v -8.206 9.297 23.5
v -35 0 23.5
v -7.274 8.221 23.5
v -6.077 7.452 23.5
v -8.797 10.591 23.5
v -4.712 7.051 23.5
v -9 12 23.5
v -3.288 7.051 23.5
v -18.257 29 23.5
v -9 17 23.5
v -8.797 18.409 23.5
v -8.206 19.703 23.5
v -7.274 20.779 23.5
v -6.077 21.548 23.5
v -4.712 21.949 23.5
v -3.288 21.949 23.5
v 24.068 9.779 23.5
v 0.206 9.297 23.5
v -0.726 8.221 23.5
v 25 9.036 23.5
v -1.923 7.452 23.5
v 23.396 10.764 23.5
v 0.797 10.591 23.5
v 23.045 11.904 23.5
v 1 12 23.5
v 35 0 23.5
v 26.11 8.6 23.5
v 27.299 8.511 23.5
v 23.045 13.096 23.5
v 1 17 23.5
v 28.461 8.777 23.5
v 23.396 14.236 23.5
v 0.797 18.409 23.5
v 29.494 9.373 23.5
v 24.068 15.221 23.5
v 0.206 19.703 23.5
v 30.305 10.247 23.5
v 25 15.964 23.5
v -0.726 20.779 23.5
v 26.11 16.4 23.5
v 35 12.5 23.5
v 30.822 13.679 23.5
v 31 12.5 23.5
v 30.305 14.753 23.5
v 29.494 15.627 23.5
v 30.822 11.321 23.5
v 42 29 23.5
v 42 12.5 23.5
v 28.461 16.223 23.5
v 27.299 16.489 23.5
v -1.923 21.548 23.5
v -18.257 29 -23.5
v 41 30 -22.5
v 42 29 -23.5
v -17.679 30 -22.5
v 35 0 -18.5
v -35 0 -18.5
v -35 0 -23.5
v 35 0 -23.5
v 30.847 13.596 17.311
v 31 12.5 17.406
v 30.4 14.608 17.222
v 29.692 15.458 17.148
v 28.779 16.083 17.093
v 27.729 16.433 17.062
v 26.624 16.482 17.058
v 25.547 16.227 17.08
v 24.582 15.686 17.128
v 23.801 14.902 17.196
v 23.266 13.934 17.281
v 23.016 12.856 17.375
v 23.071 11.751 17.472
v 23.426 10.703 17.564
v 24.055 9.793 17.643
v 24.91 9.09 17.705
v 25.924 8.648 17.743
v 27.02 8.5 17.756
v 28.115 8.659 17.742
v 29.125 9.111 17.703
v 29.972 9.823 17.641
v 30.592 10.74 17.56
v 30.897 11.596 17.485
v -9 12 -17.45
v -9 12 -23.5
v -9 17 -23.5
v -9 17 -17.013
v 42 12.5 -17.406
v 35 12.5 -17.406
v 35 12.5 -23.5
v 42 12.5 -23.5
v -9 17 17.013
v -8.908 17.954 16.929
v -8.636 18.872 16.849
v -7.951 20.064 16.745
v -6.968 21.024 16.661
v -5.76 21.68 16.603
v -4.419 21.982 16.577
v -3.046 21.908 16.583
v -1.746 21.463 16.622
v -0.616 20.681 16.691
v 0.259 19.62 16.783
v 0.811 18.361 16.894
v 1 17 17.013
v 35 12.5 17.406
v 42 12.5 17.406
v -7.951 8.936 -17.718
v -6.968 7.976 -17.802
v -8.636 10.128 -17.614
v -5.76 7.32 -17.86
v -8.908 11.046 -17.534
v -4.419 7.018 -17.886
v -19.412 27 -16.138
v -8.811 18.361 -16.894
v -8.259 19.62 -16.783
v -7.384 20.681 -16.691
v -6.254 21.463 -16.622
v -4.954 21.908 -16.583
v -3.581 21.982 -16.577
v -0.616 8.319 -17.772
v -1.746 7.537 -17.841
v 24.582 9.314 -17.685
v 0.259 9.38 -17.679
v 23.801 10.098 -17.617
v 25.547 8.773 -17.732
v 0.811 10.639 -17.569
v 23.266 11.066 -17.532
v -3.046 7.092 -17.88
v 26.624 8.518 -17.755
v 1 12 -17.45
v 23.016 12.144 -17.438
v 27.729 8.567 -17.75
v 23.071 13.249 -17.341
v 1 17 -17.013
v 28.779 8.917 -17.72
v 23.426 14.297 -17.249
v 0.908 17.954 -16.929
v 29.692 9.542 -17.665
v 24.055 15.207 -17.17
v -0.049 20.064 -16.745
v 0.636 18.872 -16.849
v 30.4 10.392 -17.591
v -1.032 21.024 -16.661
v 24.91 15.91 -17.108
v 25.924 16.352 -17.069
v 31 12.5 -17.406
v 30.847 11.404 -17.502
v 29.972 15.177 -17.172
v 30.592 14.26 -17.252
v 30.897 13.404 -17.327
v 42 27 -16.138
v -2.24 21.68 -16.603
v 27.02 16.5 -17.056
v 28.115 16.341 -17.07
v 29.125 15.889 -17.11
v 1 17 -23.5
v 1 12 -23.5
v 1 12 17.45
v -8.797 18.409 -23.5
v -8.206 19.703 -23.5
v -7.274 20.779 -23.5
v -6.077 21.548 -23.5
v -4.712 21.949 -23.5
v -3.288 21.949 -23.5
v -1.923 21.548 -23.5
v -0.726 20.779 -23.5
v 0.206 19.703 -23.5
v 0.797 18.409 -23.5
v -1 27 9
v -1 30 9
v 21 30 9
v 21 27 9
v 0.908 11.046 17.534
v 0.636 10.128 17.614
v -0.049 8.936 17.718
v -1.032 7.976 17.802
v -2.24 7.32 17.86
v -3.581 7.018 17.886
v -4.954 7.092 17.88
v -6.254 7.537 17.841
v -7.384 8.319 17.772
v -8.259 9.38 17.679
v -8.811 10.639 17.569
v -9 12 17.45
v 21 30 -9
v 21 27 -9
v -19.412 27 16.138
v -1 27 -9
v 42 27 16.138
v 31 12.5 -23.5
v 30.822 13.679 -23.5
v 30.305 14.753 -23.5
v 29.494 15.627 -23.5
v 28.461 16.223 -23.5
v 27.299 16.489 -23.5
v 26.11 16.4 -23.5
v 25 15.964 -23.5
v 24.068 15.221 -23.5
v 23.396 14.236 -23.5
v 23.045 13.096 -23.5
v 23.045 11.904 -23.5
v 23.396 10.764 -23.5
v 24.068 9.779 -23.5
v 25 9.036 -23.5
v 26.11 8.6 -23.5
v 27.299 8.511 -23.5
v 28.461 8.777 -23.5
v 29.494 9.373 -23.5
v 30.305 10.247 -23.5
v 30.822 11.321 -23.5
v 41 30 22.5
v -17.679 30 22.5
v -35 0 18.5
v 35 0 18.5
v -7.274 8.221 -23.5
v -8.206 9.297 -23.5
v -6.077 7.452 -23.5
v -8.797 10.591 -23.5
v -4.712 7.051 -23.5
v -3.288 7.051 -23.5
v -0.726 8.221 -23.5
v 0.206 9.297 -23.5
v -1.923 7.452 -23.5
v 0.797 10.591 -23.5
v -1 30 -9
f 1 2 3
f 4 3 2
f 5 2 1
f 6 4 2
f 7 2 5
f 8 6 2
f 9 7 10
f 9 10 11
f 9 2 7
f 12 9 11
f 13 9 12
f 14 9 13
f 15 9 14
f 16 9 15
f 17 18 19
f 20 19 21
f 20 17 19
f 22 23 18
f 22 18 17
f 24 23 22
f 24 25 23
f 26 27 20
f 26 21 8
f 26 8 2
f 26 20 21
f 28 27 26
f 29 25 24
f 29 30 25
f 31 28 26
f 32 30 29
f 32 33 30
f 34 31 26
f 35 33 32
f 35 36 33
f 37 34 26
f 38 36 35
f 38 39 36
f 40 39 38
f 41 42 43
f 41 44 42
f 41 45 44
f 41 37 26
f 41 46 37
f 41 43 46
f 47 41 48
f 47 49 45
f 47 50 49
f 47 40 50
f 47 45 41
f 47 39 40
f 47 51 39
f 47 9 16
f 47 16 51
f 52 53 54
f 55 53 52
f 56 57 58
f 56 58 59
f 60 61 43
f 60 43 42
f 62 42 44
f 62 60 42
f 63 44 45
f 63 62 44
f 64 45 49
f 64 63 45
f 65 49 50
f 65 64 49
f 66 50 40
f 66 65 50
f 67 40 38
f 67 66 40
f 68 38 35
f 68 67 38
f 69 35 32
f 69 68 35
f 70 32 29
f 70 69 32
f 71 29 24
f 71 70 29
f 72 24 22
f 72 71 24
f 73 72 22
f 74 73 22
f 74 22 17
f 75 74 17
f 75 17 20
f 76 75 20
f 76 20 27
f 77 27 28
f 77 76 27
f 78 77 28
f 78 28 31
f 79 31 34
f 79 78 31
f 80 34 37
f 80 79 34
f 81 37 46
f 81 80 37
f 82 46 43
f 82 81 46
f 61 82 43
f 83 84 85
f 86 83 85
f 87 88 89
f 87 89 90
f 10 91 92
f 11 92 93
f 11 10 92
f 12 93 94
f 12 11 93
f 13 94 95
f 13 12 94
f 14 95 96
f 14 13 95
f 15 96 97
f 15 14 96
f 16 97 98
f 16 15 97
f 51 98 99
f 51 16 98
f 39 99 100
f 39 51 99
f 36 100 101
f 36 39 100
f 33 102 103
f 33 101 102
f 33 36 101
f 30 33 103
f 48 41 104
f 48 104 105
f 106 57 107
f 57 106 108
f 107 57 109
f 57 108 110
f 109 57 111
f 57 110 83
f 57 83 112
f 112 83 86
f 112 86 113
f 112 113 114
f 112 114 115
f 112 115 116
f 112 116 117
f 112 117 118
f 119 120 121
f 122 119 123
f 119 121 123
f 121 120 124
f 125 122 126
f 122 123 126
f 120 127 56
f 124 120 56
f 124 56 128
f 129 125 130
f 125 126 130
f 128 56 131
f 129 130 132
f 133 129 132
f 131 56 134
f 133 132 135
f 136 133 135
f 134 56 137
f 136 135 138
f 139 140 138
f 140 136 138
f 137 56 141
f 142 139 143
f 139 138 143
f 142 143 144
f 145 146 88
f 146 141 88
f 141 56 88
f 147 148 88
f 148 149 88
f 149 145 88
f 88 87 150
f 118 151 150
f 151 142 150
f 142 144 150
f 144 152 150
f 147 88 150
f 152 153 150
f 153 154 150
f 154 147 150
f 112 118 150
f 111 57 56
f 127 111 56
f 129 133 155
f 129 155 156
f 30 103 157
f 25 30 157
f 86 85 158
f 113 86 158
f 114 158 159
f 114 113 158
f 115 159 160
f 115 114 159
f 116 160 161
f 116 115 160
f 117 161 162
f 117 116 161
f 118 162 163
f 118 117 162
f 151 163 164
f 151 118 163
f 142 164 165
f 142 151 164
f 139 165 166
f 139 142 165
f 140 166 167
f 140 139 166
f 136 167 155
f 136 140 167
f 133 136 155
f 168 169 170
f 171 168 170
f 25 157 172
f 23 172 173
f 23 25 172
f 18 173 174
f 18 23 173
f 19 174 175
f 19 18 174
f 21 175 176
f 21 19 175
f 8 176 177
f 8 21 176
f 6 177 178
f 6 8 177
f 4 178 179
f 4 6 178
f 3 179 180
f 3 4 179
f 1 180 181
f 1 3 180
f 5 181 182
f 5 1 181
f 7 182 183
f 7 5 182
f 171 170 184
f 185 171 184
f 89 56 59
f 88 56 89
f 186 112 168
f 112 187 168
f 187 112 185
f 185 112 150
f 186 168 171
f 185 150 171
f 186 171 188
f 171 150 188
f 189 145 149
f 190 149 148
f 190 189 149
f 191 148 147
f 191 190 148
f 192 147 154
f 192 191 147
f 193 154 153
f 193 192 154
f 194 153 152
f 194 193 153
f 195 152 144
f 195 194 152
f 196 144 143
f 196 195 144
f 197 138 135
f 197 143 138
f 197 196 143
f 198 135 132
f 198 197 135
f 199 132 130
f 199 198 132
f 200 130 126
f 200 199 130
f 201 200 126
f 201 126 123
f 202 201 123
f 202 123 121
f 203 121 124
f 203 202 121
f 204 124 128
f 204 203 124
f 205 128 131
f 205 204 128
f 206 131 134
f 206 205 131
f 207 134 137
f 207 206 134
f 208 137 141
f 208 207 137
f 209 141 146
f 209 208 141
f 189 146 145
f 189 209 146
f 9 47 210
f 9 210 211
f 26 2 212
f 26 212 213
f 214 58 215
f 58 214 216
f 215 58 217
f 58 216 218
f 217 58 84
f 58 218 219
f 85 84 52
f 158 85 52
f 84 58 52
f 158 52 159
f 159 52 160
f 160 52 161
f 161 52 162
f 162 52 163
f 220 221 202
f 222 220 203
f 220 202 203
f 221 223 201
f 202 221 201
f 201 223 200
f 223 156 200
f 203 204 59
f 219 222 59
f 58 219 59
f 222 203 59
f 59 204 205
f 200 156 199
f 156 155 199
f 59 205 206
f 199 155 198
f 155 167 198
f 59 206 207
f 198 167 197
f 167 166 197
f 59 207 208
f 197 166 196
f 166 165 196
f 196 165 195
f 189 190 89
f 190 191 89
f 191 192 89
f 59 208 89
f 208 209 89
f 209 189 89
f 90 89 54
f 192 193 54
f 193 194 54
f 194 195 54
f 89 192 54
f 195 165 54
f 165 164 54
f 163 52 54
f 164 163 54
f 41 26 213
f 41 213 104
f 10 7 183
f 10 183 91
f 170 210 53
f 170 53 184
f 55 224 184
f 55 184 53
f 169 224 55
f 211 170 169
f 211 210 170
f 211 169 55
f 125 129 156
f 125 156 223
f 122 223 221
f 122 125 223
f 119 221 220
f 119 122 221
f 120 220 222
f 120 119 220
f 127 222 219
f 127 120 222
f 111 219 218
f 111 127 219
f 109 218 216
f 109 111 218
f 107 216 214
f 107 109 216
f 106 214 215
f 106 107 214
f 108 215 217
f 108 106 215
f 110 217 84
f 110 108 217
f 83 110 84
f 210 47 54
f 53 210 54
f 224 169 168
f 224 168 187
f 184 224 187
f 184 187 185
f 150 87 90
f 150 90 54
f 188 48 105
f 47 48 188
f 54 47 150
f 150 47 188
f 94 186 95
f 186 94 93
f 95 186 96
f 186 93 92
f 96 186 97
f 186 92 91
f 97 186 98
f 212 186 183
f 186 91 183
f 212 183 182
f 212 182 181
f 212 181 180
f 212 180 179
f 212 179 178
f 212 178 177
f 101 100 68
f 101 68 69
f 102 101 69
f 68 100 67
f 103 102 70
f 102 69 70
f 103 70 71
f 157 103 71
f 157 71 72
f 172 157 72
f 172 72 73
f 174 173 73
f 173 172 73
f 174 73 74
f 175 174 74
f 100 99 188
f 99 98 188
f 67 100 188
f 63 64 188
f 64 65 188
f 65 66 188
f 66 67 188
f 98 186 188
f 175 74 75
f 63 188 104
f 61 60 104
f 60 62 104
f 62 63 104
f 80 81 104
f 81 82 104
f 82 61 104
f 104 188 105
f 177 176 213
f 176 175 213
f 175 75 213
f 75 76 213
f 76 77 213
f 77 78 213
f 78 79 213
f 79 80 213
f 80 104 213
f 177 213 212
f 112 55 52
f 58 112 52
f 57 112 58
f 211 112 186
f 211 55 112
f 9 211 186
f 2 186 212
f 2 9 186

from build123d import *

# Parameters (mm, degrees)
SKETCH1_R           = 4
BOSS_EXTRUDE1_DEPTH = 23.5
CUT_EXTRUDE1_REACH  = 87.914
CUT_EXTRUDE2_REACH  = 58.712
SKETCH3_W           = 22
SKETCH3_H           = 18
CHAMFER1_SIZE       = 1


with BuildPart() as part:
    # Sketch1 → Boss-Extrude1 (new, symmetric)
    with BuildSketch(Plane.XY):
        Polygon((-35, 0), (35, 0), (35, 12.5), (42, 12.5), (42, 30), (-17.679491924, 30), align=None)
        with Locations((27, 12.5)):
            Circle(SKETCH1_R, mode=Mode.SUBTRACT)
        with BuildLine():
            Line((-9, 12), (-9, 17))
            ThreePointArc((-9, 17), (-4, 22), (1, 17))
            Line((1, 17), (1, 12))
            ThreePointArc((1, 12), (-4, 7), (-9, 12))
        make_face(mode=Mode.SUBTRACT)
    extrude(amount=BOSS_EXTRUDE1_DEPTH, both=True)

    # Sketch2 → Cut-Extrude1 (cut, up to next)
    with BuildSketch(Plane(origin=(42, 0, 0), x_dir=(0, 0, -1), z_dir=(1, 0, 0)), mode=Mode.PRIVATE) as cut_extrude1_sk1:
        Polygon((-18.5, 0), (18.5, 0), (16.137806085, 27), (-16.137806085, 27), align=None)
    cut_extrude1_tool1 = extrude(cut_extrude1_sk1.sketch, amount=-CUT_EXTRUDE1_REACH, mode=Mode.PRIVATE) & part.part
    add(cut_extrude1_tool1.solids().sort_by_distance((42, 13.193114, 0))[0], mode=Mode.SUBTRACT)

    # Sketch3 → Cut-Extrude2 (cut, up to next)
    with BuildSketch(Plane(origin=(0, 30, 0), x_dir=(1, 0, 0), z_dir=(0, 1, 0)), mode=Mode.PRIVATE) as cut_extrude2_sk1:
        with Locations((10, 0)):
            Rectangle(SKETCH3_W, SKETCH3_H)
    cut_extrude2_tool1 = extrude(cut_extrude2_sk1.sketch, amount=-CUT_EXTRUDE2_REACH, mode=Mode.PRIVATE) & part.part
    add(cut_extrude2_tool1.solids().sort_by_distance((10, 30, 0))[0], mode=Mode.SUBTRACT)

    # Chamfer1
    chamfer1_edges = [part.edges().sort_by_distance(p)[0] for p in [
        (42, 30, 0),
        (12.160254038, 30, 23.5),
        (12.160254038, 30, -23.5),
    ]]
    chamfer(chamfer1_edges, length=CHAMFER1_SIZE)


solid = part.part
